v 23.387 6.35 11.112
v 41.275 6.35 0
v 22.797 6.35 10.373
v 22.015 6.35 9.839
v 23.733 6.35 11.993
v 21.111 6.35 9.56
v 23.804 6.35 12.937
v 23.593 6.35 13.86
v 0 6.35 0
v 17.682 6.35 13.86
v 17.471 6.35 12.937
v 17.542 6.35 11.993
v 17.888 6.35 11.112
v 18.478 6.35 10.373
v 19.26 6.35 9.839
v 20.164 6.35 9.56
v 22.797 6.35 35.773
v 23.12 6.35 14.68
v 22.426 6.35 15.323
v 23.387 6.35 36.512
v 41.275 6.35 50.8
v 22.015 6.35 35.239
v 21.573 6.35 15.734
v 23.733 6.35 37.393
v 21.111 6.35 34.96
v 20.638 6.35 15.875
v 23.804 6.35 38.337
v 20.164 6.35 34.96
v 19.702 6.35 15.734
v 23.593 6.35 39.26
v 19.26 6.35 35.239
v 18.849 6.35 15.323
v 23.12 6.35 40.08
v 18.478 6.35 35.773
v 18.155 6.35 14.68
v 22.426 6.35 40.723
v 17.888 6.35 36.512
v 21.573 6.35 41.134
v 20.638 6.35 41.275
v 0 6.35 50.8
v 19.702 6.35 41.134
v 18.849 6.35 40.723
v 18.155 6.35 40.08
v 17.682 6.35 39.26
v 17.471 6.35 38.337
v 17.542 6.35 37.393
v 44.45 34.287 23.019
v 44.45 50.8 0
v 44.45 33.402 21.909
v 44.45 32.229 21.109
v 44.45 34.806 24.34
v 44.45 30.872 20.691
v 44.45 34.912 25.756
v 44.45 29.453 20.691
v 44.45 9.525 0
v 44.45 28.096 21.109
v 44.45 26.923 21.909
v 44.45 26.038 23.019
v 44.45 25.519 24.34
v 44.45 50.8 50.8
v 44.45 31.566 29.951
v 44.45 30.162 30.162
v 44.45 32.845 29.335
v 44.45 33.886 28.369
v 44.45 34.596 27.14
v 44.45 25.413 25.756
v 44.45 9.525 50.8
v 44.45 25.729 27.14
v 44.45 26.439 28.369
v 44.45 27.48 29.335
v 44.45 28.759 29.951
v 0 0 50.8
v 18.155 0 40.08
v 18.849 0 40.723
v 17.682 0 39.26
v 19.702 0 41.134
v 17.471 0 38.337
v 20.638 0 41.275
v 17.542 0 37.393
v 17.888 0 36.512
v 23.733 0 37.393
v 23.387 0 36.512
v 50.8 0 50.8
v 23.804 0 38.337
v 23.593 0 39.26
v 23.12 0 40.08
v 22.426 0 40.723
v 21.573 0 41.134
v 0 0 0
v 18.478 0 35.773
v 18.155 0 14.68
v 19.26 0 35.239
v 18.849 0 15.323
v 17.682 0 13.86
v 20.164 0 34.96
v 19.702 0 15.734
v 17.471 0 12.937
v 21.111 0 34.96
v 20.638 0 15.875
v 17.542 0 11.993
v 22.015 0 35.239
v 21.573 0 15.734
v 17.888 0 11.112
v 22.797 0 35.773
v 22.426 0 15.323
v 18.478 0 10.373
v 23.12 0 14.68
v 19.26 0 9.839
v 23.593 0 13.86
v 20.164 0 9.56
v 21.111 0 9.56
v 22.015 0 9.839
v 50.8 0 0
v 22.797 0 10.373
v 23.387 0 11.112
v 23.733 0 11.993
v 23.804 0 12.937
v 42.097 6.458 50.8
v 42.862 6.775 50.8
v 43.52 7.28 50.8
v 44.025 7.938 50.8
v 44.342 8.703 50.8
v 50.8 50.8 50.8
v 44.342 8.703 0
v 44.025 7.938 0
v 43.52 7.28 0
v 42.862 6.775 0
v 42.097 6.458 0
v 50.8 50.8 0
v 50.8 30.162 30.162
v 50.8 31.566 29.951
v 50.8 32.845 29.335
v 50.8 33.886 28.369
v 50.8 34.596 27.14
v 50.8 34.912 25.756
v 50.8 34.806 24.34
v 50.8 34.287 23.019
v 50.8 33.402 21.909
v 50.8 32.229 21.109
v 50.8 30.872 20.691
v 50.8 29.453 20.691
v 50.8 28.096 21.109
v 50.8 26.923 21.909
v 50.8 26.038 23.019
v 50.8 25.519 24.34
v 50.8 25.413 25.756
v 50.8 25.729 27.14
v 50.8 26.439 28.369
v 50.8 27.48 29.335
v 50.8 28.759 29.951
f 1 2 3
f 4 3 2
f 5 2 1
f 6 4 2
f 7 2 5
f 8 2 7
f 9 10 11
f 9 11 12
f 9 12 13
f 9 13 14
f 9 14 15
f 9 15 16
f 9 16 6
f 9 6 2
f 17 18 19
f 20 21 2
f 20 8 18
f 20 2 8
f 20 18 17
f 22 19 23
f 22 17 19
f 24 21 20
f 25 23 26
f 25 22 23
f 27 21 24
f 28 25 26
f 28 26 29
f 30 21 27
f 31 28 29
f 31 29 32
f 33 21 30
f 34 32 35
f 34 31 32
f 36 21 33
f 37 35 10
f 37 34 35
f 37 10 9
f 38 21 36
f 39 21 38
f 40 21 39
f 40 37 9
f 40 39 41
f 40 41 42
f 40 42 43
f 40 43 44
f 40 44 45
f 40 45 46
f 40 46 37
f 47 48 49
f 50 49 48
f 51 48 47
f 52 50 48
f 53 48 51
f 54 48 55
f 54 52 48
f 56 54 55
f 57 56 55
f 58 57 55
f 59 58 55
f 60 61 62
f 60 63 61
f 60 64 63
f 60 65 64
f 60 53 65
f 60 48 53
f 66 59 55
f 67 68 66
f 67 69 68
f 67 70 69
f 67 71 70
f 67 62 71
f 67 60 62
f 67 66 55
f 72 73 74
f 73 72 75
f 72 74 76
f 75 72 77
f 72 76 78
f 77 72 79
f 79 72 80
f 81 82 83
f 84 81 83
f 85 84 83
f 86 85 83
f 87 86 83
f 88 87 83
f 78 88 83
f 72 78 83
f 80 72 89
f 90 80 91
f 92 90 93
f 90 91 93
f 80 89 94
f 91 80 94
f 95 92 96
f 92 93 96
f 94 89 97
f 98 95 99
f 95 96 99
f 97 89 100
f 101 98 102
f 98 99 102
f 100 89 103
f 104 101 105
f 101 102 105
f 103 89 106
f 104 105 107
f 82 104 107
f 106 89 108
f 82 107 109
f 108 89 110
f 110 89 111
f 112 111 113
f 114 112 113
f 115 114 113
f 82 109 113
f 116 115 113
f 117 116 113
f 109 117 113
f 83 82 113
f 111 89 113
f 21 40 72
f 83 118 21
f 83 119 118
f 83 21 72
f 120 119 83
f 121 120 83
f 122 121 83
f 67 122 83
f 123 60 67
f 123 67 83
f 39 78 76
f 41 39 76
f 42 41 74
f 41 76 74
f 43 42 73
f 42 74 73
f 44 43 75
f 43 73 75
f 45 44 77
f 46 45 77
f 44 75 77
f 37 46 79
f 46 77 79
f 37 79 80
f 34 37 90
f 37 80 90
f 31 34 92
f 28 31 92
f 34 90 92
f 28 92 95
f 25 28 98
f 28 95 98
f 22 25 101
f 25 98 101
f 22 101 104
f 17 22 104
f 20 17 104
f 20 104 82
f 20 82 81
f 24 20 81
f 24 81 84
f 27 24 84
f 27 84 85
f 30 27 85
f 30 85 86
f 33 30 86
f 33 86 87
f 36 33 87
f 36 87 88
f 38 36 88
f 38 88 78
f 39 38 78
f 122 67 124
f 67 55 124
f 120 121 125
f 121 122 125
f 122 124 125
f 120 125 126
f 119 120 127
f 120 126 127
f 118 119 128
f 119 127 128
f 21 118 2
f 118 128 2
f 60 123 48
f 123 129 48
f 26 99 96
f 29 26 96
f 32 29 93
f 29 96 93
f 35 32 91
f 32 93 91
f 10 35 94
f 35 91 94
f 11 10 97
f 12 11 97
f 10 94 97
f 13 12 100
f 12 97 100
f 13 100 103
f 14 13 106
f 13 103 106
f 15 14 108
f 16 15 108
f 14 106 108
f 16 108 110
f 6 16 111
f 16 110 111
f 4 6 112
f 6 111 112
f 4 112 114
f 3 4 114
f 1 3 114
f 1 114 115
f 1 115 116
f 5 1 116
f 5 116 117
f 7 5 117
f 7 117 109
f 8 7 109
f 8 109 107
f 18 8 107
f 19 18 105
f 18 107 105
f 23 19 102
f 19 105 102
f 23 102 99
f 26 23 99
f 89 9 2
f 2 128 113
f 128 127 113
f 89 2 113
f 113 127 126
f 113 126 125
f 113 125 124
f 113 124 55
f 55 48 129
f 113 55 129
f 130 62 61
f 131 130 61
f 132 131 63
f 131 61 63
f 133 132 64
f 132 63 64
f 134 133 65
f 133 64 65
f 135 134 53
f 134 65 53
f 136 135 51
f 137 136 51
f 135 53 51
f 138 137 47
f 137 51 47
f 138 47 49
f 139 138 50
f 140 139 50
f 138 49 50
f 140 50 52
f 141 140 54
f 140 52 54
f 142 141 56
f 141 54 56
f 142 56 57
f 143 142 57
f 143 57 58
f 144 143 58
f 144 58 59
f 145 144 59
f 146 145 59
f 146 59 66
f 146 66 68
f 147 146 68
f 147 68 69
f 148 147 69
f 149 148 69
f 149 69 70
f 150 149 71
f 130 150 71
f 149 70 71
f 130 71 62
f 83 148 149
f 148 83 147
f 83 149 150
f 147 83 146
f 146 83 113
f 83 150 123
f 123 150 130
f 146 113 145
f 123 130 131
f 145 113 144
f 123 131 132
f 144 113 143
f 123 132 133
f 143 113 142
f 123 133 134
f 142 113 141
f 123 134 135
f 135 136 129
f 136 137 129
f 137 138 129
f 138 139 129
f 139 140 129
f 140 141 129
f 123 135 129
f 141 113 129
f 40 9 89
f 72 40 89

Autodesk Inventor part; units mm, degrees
ref_plane "YZ Plane" through (0, 0, 0) normal (1, 0, 0) x (0, 1, 0)
ref_plane "XZ Plane" through (0, 0, 0) normal (0, 1, 0) x (-1, 0, 0)
ref_plane "XY Plane" through (0, 0, 0) normal (0, 0, 1) x (1, 0, 0)
sketch "Sketch1" plane through (0, 0, 0) normal (0, 0, 1) x (1, 0, 0)
  line L0 (0, 0) -> (50.8, 0)
  line L1 (50.8, 0) -> (50.8, 50.8)
  line L2 (50.8, 50.8) -> (0, 50.8)
  line L3 (0, 50.8) -> (0, 0)
  dimension "d0" = 50.8
  dimension "d1" = 50.8
extrude "Extrusion1" add sketch "Sketch1" along normal blind 50.8
sketch "Sketch2" plane through (0, 0, 50.8) normal (0, 0, 1) x (1, 0, 0)
  line L0 (0, 50.8) -> (44.45, 50.8)
  line L1 (44.45, 50.8) -> (44.45, 6.35)
  line L2 (44.45, 6.35) -> (0, 6.35)
  line L3 (0, 6.35) -> (0, 50.8)
  point P0 (0, 0)
  dimension "d4" = 44.45
  dimension "d5" = 44.45
extrude "Extrusion2" cut sketch "Sketch2" against normal blind 152.4
fillet "Fillet1" radius 3.175 1 edges at (44.45, 6.35, 25.4)
sketch "Sketch3" plane through (44.45, 50.8, 0) normal (-1, 0, 0) x (0, 0, 1)
  circle A0 centre (25.4, -20.6375) radius 4.7625
  line L0 (0, -41.275) -> (0, 0) projected
  line L1 (0, 0) -> (50.8, 0) projected
  point P0 (0, -50.8)
  dimension "d9" = 9.525
  dimension "d10" = 25.4
  dimension "d11" = 20.6375
extrude "Extrusion3" cut sketch "Sketch3" against normal blind 152.4
sketch "Sketch4" plane through (0, 6.35, 50.8) normal (0, 1, 0) x (1, 0, 0)
  line L0 (0, 50.8) -> (41.275, 50.8) projected
  line L1 (0, 0) -> (0, 50.8) projected
  point P0 (20.6375, 38.1)
  point P1 (20.6375, 12.7)
  dimension "d14" = 25.4
  dimension "d15" = 12.7
  dimension "d16" = 20.6375
  dimension "d17" = 20.6375
hole "Hole1" at (20.6375, 6.35, 12.7) at (20.6375, 6.35, 38.1) direction (0, -1, 0) diameter 6.35 end through all
properties part number "clevece plate"
